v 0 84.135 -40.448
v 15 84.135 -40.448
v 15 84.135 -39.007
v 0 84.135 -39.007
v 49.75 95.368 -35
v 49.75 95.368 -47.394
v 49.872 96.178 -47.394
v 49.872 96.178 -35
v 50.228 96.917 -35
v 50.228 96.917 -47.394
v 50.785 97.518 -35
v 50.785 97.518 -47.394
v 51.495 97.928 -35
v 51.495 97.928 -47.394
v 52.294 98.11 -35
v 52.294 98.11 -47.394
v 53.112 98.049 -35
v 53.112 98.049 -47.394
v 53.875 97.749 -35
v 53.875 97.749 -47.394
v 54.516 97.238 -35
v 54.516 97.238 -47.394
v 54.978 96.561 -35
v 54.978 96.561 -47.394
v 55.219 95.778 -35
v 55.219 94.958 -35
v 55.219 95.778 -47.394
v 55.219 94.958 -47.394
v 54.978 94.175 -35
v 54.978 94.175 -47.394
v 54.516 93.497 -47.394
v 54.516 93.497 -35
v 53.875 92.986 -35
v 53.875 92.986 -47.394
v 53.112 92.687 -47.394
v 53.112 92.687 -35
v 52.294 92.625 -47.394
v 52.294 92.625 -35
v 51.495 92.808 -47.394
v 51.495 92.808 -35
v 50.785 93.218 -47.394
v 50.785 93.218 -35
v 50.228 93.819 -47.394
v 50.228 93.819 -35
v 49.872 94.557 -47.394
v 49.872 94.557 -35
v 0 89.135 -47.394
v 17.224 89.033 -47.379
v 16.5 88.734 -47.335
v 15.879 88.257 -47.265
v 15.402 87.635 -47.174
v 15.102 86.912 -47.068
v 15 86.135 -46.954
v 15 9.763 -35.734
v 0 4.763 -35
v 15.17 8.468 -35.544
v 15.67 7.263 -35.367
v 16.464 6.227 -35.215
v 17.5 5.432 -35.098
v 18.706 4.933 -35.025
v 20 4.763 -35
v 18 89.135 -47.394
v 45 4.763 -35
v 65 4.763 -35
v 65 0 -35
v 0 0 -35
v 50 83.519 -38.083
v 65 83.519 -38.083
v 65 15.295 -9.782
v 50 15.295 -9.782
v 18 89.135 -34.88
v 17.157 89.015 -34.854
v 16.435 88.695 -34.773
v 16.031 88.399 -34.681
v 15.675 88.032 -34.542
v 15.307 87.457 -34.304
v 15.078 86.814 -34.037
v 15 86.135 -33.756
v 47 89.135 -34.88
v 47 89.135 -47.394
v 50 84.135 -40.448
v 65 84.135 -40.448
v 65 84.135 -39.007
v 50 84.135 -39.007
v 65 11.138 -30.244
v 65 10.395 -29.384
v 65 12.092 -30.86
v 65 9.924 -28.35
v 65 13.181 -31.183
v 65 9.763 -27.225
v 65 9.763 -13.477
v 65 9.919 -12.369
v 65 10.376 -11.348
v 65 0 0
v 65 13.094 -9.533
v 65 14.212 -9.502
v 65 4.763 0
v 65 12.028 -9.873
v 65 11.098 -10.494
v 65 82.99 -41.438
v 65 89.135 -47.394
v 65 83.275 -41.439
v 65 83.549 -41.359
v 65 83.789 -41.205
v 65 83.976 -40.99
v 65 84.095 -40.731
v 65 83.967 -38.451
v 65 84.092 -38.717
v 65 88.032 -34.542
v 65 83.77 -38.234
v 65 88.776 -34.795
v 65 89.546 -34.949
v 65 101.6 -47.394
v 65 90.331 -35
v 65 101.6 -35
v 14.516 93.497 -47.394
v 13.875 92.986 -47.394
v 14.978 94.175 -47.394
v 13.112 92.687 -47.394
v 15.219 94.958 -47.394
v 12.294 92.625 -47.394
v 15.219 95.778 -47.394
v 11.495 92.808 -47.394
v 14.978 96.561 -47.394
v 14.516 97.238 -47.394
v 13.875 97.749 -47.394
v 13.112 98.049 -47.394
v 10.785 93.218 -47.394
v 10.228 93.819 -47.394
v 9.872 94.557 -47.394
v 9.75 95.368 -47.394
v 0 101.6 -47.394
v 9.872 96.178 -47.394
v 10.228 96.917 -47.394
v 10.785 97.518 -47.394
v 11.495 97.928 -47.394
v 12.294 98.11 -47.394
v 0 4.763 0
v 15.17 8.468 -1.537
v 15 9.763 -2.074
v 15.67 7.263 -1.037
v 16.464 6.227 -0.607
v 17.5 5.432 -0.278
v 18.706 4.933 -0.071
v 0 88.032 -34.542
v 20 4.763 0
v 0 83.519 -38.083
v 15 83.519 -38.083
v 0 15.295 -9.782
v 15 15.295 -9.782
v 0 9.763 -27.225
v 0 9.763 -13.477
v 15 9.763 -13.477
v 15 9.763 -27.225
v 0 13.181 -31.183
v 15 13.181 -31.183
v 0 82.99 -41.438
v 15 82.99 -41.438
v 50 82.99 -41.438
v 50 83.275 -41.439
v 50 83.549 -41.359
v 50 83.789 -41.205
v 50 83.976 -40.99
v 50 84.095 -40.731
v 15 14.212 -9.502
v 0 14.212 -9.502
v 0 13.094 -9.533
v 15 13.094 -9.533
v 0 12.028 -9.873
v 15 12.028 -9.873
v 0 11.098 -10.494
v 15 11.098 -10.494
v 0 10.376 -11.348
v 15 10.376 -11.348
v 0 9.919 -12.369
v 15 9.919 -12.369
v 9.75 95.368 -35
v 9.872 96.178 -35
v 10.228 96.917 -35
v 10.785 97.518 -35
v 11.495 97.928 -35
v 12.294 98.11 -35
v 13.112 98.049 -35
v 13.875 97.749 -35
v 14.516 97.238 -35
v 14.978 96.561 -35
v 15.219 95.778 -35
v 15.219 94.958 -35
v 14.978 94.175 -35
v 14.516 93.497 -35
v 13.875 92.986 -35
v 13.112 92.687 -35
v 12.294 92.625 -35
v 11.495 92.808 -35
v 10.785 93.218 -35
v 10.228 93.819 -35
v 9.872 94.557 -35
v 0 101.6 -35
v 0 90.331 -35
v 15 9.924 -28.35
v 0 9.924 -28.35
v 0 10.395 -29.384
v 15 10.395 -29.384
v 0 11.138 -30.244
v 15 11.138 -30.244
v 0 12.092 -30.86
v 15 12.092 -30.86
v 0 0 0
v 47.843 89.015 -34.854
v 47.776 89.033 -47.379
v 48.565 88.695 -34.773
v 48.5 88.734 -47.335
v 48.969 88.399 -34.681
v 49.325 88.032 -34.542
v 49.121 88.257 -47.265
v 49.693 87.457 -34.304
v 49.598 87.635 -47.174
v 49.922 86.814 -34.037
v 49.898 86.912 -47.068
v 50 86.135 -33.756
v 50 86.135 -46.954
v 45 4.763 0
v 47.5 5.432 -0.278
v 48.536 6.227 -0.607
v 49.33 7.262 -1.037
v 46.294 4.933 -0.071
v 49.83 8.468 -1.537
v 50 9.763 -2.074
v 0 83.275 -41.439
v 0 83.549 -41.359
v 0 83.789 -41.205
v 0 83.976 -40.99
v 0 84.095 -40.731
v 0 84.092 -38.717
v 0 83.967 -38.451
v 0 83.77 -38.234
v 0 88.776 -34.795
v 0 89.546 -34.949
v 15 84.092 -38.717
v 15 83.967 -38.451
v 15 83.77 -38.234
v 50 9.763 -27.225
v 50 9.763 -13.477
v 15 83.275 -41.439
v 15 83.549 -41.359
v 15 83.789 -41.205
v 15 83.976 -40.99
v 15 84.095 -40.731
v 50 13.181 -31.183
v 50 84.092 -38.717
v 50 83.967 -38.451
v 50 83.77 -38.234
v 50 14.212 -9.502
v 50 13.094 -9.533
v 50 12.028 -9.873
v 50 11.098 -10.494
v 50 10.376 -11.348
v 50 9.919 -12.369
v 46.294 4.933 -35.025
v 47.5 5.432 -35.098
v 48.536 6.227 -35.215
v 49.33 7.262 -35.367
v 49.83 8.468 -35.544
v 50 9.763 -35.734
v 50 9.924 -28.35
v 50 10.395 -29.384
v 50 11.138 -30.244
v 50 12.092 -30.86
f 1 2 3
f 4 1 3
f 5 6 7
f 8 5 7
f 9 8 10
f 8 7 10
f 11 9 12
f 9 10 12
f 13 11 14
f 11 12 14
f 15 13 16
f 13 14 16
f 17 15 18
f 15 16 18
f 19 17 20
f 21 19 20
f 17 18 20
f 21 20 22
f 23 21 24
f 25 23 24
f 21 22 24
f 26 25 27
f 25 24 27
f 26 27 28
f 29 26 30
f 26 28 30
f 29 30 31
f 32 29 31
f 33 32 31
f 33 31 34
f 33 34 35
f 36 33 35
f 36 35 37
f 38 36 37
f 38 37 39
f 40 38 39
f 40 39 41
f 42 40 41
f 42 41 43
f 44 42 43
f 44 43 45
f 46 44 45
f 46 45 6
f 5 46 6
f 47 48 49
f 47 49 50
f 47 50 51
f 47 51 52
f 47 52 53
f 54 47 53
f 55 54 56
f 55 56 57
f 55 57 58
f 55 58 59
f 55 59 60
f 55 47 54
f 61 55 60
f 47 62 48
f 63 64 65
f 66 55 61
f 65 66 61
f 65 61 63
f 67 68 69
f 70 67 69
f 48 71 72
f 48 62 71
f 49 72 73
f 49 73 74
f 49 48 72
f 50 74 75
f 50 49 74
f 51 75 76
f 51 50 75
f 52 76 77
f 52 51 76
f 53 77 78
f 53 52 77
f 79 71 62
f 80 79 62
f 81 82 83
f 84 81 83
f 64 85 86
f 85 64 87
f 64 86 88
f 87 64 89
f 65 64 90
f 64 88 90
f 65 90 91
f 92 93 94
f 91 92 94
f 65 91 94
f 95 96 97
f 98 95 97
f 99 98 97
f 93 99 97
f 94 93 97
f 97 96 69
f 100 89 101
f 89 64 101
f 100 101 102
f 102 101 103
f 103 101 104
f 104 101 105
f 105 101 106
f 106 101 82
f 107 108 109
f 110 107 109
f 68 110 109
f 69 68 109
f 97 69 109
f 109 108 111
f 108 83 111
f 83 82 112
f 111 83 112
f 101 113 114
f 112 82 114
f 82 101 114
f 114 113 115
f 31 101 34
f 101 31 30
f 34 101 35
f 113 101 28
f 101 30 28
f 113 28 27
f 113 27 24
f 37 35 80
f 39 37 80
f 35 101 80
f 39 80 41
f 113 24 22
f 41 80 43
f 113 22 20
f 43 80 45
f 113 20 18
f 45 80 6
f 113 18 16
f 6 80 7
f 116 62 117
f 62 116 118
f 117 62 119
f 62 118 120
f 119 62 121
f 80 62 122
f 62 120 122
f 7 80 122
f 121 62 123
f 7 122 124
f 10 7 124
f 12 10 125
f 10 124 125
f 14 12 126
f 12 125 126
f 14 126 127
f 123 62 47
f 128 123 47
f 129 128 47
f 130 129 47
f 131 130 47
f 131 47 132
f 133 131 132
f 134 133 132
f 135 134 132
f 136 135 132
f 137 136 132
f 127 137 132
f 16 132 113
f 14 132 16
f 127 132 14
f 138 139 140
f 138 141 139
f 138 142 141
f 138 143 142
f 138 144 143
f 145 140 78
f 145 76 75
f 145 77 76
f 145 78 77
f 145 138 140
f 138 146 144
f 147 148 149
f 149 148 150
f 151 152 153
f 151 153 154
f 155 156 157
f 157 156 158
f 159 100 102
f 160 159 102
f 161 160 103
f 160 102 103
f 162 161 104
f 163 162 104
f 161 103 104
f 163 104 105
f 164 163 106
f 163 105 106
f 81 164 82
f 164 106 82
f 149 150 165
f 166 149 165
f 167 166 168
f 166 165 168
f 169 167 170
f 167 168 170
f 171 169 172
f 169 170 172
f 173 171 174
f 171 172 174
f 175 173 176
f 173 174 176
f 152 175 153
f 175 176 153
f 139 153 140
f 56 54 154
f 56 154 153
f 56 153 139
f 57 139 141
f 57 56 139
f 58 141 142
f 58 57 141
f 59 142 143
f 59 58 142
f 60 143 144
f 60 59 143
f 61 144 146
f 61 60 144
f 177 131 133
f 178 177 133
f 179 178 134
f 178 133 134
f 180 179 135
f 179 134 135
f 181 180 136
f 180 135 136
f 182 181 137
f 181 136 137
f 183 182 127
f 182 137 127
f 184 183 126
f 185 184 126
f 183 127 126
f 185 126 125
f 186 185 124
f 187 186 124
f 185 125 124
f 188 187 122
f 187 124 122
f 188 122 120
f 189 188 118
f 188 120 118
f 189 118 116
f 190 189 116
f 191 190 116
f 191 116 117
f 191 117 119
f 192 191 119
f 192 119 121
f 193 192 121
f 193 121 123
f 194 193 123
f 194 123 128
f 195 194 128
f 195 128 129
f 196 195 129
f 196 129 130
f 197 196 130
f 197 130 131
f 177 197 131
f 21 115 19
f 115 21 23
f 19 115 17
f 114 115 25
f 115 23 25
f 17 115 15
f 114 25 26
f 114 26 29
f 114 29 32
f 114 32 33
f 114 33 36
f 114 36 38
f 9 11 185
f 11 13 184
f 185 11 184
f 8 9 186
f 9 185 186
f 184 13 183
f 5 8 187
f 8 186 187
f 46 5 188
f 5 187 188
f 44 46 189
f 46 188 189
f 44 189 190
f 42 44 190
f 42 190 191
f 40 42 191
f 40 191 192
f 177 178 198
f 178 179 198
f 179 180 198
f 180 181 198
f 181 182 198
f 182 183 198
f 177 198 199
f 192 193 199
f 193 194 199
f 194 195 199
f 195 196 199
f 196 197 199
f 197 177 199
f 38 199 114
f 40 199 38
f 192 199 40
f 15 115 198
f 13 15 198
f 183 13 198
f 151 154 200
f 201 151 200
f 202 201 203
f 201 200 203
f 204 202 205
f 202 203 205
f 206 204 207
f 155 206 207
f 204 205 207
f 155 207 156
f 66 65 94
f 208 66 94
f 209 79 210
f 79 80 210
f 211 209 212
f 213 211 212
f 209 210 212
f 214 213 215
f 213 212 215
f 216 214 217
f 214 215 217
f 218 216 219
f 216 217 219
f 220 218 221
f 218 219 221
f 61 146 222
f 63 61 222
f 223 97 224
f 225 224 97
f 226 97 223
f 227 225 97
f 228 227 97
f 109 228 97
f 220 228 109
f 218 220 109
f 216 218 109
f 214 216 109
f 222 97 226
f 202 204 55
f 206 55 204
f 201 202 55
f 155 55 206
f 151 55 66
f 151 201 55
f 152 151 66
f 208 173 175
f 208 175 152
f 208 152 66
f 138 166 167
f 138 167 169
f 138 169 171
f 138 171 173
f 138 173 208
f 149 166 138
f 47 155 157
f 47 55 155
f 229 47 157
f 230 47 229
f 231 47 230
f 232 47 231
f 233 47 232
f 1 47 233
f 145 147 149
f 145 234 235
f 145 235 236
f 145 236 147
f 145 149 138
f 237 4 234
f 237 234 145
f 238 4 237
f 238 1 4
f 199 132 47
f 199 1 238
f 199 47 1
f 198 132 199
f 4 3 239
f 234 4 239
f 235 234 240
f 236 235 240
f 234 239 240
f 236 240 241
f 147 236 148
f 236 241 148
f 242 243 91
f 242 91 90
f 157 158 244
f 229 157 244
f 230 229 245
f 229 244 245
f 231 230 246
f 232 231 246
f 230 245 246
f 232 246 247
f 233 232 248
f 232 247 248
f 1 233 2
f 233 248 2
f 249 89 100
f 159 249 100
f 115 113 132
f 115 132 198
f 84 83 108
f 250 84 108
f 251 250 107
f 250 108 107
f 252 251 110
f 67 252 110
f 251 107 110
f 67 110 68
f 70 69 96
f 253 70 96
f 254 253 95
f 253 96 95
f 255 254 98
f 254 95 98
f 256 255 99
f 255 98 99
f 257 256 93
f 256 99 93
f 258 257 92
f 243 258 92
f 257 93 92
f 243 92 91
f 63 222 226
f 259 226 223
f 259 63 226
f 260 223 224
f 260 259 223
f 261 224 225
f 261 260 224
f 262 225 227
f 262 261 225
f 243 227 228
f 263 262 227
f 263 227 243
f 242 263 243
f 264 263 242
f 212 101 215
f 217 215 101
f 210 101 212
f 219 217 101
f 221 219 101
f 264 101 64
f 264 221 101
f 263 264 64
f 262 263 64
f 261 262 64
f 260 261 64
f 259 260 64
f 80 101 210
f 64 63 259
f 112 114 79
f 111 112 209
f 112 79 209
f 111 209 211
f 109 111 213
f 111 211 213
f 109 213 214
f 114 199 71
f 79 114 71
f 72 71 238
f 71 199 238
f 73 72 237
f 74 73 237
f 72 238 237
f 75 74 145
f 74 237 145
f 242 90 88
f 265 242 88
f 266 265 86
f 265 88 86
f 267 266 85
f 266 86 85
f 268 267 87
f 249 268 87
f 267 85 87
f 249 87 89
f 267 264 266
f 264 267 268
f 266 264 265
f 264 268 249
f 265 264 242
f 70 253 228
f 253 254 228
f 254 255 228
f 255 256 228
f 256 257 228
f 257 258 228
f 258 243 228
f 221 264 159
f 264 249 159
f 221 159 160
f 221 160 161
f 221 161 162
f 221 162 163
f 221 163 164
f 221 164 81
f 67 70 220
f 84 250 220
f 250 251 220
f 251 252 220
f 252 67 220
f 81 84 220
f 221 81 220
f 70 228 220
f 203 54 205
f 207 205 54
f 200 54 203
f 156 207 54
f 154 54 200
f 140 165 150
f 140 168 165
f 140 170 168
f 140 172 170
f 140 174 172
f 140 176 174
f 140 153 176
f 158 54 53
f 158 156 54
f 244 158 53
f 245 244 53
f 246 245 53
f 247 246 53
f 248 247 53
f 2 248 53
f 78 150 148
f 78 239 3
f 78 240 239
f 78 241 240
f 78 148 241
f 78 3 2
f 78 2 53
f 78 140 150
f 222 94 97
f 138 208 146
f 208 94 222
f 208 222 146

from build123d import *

# Parameters (mm, degrees)
BOSS_EXTRUDE1_DEPTH = 65
SKETCH2_W           = 35.00000000000001
SKETCH2_H           = 96.83750000000002
CUT_EXTRUDE1_DEPTH  = 130.59080671274705
FILLET1_R           = 5
CUT_EXTRUDE2_DEPTH  = 130.59080671274705
BOSS_EXTRUDE2_DEPTH = 35
SKETCH5_R           = 2.7500000000000084
SKETCH5_R_2         = 2.7499999999999956
CUT_EXTRUDE3_DEPTH  = 130.59080671274705
FILLET3_R           = 3


with BuildPart() as part:
    # Sketch1 → Boss-Extrude1 (new body)
    with BuildSketch(Plane(origin=(0, 0, 0), x_dir=(0, 0, -1), z_dir=(1, 0, 0))):
        with BuildLine():
            Line((47.39427375180004, 101.60000000000002), (47.39427375180004, 89.13544686995567))
            Line((47.39427375180004, 89.13544686995567), (35.000000000000014, 4.762500000000003))
            Line((35.000000000000014, 4.762500000000003), (35.000000000000014, 0))
            Line((35.000000000000014, 0), (0, 0))
            Line((0, 0), (0, 4.762500000000003))
            Line((0, 4.762500000000003), (34.54207855565439, 88.03155596440176))
            ThreePointArc((34.54207855565439, 88.03155596440176), (34.88440614395058, 89.15847126507197), (35.000000000000014, 90.3305481964365))
            Line((35.000000000000014, 90.3305481964365), (35.000000000000014, 101.60000000000002))
            Line((35.000000000000014, 101.60000000000002), (47.39427375180004, 101.60000000000002))
        make_face()
    extrude(amount=BOSS_EXTRUDE1_DEPTH)

    # Sketch2 → Cut-Extrude1 (cut, through all)
    with BuildSketch(Plane.XY):
        with Locations((32.50000000000001, 53.18125000000001)):
            Rectangle(SKETCH2_W, SKETCH2_H)
    extrude(amount=-CUT_EXTRUDE1_DEPTH, mode=Mode.SUBTRACT)

    # Fillet1
    fillet1_edges = [part.edges().sort_by_distance(p)[0] for p in [
        (50, 4.762500000000003, -17.500000000000007),
        (15, 4.762500000000003, -17.500000000000007),
    ]]
    fillet(fillet1_edges, radius=FILLET1_R)

    # Sketch3 → Cut-Extrude2 (cut, through all)
    with BuildSketch(Plane(origin=(65, 0, 0), x_dir=(0, 0, -1), z_dir=(1, 0, 0))):
        with BuildLine():
            Line((38.08312858614837, 83.51861224196143), (9.782341841456388, 15.295161488023126))
            ThreePointArc((9.782341841456388, 15.295161488023126), (10.15060285597038, 11.541086705731292), (13.477060878559312, 9.762500000000001))
            Line((13.477060878559312, 9.762500000000001), (27.225499843288624, 9.762500000000001))
            ThreePointArc((27.225499843288624, 9.762500000000001), (29.84032084558306, 10.735502952436189), (31.18302757021517, 13.181144437020006))
            Line((31.18302757021517, 13.181144437020006), (41.43787152872858, 82.99010797921063))
            ThreePointArc((41.43787152872858, 82.99010797921063), (41.20523885888791, 83.78915212052925), (40.44848959699694, 84.13544686995566))
            Line((40.44848959699694, 84.13544686995566), (39.006808345424105, 84.13544686995566))
            ThreePointArc((39.006808345424105, 84.13544686995566), (38.45145502185692, 83.96706137560288), (38.08312858614837, 83.51861224196143))
        make_face()
    extrude(amount=-CUT_EXTRUDE2_DEPTH, mode=Mode.SUBTRACT)

    # Sketch4 → Boss-Extrude2 (add)
    with BuildSketch(Plane(origin=(15, 0, 0), x_dir=(0, 0, -1), z_dir=(1, 0, 0))):
        with BuildLine():
            Line((47.39427375180004, 89.13544686995567), (47.39427375180004, 101.60000000000002))
            Line((47.39427375180004, 101.60000000000002), (35.000000000000014, 101.60000000000002))
            Line((35.000000000000014, 101.60000000000002), (35.000000000000014, 90.3305481964365))
            ThreePointArc((35.000000000000014, 90.3305481964365), (34.969867635356294, 89.72998145049917), (34.87977319455811, 89.13544686995567))
            Line((34.87977319455811, 89.13544686995567), (47.39427375180004, 89.13544686995567))
        make_face()
    extrude(amount=BOSS_EXTRUDE2_DEPTH)

    # Sketch5 → Cut-Extrude3 (cut, through all)
    with BuildSketch(Plane(origin=(0, 0, -47.39427375180004), x_dir=(-1, 0, 0), z_dir=(0, 0, -1))):
        with Locations((-52.50000000000002, 95.36772343497786)):
            Circle(SKETCH5_R)
        with Locations((-12.499999999999996, 95.36772343497786)):
            Circle(SKETCH5_R_2)
    extrude(amount=-CUT_EXTRUDE3_DEPTH, mode=Mode.SUBTRACT)

    # Fillet3
    fillet3_edges = [part.edges().sort_by_distance(p)[0] for p in [
        (15, 89.13544686995567, -41.13702347317908),
        (50, 89.13544686995567, -41.13702347317908),
    ]]
    fillet(fillet3_edges, radius=FILLET3_R)


solid = part.part
